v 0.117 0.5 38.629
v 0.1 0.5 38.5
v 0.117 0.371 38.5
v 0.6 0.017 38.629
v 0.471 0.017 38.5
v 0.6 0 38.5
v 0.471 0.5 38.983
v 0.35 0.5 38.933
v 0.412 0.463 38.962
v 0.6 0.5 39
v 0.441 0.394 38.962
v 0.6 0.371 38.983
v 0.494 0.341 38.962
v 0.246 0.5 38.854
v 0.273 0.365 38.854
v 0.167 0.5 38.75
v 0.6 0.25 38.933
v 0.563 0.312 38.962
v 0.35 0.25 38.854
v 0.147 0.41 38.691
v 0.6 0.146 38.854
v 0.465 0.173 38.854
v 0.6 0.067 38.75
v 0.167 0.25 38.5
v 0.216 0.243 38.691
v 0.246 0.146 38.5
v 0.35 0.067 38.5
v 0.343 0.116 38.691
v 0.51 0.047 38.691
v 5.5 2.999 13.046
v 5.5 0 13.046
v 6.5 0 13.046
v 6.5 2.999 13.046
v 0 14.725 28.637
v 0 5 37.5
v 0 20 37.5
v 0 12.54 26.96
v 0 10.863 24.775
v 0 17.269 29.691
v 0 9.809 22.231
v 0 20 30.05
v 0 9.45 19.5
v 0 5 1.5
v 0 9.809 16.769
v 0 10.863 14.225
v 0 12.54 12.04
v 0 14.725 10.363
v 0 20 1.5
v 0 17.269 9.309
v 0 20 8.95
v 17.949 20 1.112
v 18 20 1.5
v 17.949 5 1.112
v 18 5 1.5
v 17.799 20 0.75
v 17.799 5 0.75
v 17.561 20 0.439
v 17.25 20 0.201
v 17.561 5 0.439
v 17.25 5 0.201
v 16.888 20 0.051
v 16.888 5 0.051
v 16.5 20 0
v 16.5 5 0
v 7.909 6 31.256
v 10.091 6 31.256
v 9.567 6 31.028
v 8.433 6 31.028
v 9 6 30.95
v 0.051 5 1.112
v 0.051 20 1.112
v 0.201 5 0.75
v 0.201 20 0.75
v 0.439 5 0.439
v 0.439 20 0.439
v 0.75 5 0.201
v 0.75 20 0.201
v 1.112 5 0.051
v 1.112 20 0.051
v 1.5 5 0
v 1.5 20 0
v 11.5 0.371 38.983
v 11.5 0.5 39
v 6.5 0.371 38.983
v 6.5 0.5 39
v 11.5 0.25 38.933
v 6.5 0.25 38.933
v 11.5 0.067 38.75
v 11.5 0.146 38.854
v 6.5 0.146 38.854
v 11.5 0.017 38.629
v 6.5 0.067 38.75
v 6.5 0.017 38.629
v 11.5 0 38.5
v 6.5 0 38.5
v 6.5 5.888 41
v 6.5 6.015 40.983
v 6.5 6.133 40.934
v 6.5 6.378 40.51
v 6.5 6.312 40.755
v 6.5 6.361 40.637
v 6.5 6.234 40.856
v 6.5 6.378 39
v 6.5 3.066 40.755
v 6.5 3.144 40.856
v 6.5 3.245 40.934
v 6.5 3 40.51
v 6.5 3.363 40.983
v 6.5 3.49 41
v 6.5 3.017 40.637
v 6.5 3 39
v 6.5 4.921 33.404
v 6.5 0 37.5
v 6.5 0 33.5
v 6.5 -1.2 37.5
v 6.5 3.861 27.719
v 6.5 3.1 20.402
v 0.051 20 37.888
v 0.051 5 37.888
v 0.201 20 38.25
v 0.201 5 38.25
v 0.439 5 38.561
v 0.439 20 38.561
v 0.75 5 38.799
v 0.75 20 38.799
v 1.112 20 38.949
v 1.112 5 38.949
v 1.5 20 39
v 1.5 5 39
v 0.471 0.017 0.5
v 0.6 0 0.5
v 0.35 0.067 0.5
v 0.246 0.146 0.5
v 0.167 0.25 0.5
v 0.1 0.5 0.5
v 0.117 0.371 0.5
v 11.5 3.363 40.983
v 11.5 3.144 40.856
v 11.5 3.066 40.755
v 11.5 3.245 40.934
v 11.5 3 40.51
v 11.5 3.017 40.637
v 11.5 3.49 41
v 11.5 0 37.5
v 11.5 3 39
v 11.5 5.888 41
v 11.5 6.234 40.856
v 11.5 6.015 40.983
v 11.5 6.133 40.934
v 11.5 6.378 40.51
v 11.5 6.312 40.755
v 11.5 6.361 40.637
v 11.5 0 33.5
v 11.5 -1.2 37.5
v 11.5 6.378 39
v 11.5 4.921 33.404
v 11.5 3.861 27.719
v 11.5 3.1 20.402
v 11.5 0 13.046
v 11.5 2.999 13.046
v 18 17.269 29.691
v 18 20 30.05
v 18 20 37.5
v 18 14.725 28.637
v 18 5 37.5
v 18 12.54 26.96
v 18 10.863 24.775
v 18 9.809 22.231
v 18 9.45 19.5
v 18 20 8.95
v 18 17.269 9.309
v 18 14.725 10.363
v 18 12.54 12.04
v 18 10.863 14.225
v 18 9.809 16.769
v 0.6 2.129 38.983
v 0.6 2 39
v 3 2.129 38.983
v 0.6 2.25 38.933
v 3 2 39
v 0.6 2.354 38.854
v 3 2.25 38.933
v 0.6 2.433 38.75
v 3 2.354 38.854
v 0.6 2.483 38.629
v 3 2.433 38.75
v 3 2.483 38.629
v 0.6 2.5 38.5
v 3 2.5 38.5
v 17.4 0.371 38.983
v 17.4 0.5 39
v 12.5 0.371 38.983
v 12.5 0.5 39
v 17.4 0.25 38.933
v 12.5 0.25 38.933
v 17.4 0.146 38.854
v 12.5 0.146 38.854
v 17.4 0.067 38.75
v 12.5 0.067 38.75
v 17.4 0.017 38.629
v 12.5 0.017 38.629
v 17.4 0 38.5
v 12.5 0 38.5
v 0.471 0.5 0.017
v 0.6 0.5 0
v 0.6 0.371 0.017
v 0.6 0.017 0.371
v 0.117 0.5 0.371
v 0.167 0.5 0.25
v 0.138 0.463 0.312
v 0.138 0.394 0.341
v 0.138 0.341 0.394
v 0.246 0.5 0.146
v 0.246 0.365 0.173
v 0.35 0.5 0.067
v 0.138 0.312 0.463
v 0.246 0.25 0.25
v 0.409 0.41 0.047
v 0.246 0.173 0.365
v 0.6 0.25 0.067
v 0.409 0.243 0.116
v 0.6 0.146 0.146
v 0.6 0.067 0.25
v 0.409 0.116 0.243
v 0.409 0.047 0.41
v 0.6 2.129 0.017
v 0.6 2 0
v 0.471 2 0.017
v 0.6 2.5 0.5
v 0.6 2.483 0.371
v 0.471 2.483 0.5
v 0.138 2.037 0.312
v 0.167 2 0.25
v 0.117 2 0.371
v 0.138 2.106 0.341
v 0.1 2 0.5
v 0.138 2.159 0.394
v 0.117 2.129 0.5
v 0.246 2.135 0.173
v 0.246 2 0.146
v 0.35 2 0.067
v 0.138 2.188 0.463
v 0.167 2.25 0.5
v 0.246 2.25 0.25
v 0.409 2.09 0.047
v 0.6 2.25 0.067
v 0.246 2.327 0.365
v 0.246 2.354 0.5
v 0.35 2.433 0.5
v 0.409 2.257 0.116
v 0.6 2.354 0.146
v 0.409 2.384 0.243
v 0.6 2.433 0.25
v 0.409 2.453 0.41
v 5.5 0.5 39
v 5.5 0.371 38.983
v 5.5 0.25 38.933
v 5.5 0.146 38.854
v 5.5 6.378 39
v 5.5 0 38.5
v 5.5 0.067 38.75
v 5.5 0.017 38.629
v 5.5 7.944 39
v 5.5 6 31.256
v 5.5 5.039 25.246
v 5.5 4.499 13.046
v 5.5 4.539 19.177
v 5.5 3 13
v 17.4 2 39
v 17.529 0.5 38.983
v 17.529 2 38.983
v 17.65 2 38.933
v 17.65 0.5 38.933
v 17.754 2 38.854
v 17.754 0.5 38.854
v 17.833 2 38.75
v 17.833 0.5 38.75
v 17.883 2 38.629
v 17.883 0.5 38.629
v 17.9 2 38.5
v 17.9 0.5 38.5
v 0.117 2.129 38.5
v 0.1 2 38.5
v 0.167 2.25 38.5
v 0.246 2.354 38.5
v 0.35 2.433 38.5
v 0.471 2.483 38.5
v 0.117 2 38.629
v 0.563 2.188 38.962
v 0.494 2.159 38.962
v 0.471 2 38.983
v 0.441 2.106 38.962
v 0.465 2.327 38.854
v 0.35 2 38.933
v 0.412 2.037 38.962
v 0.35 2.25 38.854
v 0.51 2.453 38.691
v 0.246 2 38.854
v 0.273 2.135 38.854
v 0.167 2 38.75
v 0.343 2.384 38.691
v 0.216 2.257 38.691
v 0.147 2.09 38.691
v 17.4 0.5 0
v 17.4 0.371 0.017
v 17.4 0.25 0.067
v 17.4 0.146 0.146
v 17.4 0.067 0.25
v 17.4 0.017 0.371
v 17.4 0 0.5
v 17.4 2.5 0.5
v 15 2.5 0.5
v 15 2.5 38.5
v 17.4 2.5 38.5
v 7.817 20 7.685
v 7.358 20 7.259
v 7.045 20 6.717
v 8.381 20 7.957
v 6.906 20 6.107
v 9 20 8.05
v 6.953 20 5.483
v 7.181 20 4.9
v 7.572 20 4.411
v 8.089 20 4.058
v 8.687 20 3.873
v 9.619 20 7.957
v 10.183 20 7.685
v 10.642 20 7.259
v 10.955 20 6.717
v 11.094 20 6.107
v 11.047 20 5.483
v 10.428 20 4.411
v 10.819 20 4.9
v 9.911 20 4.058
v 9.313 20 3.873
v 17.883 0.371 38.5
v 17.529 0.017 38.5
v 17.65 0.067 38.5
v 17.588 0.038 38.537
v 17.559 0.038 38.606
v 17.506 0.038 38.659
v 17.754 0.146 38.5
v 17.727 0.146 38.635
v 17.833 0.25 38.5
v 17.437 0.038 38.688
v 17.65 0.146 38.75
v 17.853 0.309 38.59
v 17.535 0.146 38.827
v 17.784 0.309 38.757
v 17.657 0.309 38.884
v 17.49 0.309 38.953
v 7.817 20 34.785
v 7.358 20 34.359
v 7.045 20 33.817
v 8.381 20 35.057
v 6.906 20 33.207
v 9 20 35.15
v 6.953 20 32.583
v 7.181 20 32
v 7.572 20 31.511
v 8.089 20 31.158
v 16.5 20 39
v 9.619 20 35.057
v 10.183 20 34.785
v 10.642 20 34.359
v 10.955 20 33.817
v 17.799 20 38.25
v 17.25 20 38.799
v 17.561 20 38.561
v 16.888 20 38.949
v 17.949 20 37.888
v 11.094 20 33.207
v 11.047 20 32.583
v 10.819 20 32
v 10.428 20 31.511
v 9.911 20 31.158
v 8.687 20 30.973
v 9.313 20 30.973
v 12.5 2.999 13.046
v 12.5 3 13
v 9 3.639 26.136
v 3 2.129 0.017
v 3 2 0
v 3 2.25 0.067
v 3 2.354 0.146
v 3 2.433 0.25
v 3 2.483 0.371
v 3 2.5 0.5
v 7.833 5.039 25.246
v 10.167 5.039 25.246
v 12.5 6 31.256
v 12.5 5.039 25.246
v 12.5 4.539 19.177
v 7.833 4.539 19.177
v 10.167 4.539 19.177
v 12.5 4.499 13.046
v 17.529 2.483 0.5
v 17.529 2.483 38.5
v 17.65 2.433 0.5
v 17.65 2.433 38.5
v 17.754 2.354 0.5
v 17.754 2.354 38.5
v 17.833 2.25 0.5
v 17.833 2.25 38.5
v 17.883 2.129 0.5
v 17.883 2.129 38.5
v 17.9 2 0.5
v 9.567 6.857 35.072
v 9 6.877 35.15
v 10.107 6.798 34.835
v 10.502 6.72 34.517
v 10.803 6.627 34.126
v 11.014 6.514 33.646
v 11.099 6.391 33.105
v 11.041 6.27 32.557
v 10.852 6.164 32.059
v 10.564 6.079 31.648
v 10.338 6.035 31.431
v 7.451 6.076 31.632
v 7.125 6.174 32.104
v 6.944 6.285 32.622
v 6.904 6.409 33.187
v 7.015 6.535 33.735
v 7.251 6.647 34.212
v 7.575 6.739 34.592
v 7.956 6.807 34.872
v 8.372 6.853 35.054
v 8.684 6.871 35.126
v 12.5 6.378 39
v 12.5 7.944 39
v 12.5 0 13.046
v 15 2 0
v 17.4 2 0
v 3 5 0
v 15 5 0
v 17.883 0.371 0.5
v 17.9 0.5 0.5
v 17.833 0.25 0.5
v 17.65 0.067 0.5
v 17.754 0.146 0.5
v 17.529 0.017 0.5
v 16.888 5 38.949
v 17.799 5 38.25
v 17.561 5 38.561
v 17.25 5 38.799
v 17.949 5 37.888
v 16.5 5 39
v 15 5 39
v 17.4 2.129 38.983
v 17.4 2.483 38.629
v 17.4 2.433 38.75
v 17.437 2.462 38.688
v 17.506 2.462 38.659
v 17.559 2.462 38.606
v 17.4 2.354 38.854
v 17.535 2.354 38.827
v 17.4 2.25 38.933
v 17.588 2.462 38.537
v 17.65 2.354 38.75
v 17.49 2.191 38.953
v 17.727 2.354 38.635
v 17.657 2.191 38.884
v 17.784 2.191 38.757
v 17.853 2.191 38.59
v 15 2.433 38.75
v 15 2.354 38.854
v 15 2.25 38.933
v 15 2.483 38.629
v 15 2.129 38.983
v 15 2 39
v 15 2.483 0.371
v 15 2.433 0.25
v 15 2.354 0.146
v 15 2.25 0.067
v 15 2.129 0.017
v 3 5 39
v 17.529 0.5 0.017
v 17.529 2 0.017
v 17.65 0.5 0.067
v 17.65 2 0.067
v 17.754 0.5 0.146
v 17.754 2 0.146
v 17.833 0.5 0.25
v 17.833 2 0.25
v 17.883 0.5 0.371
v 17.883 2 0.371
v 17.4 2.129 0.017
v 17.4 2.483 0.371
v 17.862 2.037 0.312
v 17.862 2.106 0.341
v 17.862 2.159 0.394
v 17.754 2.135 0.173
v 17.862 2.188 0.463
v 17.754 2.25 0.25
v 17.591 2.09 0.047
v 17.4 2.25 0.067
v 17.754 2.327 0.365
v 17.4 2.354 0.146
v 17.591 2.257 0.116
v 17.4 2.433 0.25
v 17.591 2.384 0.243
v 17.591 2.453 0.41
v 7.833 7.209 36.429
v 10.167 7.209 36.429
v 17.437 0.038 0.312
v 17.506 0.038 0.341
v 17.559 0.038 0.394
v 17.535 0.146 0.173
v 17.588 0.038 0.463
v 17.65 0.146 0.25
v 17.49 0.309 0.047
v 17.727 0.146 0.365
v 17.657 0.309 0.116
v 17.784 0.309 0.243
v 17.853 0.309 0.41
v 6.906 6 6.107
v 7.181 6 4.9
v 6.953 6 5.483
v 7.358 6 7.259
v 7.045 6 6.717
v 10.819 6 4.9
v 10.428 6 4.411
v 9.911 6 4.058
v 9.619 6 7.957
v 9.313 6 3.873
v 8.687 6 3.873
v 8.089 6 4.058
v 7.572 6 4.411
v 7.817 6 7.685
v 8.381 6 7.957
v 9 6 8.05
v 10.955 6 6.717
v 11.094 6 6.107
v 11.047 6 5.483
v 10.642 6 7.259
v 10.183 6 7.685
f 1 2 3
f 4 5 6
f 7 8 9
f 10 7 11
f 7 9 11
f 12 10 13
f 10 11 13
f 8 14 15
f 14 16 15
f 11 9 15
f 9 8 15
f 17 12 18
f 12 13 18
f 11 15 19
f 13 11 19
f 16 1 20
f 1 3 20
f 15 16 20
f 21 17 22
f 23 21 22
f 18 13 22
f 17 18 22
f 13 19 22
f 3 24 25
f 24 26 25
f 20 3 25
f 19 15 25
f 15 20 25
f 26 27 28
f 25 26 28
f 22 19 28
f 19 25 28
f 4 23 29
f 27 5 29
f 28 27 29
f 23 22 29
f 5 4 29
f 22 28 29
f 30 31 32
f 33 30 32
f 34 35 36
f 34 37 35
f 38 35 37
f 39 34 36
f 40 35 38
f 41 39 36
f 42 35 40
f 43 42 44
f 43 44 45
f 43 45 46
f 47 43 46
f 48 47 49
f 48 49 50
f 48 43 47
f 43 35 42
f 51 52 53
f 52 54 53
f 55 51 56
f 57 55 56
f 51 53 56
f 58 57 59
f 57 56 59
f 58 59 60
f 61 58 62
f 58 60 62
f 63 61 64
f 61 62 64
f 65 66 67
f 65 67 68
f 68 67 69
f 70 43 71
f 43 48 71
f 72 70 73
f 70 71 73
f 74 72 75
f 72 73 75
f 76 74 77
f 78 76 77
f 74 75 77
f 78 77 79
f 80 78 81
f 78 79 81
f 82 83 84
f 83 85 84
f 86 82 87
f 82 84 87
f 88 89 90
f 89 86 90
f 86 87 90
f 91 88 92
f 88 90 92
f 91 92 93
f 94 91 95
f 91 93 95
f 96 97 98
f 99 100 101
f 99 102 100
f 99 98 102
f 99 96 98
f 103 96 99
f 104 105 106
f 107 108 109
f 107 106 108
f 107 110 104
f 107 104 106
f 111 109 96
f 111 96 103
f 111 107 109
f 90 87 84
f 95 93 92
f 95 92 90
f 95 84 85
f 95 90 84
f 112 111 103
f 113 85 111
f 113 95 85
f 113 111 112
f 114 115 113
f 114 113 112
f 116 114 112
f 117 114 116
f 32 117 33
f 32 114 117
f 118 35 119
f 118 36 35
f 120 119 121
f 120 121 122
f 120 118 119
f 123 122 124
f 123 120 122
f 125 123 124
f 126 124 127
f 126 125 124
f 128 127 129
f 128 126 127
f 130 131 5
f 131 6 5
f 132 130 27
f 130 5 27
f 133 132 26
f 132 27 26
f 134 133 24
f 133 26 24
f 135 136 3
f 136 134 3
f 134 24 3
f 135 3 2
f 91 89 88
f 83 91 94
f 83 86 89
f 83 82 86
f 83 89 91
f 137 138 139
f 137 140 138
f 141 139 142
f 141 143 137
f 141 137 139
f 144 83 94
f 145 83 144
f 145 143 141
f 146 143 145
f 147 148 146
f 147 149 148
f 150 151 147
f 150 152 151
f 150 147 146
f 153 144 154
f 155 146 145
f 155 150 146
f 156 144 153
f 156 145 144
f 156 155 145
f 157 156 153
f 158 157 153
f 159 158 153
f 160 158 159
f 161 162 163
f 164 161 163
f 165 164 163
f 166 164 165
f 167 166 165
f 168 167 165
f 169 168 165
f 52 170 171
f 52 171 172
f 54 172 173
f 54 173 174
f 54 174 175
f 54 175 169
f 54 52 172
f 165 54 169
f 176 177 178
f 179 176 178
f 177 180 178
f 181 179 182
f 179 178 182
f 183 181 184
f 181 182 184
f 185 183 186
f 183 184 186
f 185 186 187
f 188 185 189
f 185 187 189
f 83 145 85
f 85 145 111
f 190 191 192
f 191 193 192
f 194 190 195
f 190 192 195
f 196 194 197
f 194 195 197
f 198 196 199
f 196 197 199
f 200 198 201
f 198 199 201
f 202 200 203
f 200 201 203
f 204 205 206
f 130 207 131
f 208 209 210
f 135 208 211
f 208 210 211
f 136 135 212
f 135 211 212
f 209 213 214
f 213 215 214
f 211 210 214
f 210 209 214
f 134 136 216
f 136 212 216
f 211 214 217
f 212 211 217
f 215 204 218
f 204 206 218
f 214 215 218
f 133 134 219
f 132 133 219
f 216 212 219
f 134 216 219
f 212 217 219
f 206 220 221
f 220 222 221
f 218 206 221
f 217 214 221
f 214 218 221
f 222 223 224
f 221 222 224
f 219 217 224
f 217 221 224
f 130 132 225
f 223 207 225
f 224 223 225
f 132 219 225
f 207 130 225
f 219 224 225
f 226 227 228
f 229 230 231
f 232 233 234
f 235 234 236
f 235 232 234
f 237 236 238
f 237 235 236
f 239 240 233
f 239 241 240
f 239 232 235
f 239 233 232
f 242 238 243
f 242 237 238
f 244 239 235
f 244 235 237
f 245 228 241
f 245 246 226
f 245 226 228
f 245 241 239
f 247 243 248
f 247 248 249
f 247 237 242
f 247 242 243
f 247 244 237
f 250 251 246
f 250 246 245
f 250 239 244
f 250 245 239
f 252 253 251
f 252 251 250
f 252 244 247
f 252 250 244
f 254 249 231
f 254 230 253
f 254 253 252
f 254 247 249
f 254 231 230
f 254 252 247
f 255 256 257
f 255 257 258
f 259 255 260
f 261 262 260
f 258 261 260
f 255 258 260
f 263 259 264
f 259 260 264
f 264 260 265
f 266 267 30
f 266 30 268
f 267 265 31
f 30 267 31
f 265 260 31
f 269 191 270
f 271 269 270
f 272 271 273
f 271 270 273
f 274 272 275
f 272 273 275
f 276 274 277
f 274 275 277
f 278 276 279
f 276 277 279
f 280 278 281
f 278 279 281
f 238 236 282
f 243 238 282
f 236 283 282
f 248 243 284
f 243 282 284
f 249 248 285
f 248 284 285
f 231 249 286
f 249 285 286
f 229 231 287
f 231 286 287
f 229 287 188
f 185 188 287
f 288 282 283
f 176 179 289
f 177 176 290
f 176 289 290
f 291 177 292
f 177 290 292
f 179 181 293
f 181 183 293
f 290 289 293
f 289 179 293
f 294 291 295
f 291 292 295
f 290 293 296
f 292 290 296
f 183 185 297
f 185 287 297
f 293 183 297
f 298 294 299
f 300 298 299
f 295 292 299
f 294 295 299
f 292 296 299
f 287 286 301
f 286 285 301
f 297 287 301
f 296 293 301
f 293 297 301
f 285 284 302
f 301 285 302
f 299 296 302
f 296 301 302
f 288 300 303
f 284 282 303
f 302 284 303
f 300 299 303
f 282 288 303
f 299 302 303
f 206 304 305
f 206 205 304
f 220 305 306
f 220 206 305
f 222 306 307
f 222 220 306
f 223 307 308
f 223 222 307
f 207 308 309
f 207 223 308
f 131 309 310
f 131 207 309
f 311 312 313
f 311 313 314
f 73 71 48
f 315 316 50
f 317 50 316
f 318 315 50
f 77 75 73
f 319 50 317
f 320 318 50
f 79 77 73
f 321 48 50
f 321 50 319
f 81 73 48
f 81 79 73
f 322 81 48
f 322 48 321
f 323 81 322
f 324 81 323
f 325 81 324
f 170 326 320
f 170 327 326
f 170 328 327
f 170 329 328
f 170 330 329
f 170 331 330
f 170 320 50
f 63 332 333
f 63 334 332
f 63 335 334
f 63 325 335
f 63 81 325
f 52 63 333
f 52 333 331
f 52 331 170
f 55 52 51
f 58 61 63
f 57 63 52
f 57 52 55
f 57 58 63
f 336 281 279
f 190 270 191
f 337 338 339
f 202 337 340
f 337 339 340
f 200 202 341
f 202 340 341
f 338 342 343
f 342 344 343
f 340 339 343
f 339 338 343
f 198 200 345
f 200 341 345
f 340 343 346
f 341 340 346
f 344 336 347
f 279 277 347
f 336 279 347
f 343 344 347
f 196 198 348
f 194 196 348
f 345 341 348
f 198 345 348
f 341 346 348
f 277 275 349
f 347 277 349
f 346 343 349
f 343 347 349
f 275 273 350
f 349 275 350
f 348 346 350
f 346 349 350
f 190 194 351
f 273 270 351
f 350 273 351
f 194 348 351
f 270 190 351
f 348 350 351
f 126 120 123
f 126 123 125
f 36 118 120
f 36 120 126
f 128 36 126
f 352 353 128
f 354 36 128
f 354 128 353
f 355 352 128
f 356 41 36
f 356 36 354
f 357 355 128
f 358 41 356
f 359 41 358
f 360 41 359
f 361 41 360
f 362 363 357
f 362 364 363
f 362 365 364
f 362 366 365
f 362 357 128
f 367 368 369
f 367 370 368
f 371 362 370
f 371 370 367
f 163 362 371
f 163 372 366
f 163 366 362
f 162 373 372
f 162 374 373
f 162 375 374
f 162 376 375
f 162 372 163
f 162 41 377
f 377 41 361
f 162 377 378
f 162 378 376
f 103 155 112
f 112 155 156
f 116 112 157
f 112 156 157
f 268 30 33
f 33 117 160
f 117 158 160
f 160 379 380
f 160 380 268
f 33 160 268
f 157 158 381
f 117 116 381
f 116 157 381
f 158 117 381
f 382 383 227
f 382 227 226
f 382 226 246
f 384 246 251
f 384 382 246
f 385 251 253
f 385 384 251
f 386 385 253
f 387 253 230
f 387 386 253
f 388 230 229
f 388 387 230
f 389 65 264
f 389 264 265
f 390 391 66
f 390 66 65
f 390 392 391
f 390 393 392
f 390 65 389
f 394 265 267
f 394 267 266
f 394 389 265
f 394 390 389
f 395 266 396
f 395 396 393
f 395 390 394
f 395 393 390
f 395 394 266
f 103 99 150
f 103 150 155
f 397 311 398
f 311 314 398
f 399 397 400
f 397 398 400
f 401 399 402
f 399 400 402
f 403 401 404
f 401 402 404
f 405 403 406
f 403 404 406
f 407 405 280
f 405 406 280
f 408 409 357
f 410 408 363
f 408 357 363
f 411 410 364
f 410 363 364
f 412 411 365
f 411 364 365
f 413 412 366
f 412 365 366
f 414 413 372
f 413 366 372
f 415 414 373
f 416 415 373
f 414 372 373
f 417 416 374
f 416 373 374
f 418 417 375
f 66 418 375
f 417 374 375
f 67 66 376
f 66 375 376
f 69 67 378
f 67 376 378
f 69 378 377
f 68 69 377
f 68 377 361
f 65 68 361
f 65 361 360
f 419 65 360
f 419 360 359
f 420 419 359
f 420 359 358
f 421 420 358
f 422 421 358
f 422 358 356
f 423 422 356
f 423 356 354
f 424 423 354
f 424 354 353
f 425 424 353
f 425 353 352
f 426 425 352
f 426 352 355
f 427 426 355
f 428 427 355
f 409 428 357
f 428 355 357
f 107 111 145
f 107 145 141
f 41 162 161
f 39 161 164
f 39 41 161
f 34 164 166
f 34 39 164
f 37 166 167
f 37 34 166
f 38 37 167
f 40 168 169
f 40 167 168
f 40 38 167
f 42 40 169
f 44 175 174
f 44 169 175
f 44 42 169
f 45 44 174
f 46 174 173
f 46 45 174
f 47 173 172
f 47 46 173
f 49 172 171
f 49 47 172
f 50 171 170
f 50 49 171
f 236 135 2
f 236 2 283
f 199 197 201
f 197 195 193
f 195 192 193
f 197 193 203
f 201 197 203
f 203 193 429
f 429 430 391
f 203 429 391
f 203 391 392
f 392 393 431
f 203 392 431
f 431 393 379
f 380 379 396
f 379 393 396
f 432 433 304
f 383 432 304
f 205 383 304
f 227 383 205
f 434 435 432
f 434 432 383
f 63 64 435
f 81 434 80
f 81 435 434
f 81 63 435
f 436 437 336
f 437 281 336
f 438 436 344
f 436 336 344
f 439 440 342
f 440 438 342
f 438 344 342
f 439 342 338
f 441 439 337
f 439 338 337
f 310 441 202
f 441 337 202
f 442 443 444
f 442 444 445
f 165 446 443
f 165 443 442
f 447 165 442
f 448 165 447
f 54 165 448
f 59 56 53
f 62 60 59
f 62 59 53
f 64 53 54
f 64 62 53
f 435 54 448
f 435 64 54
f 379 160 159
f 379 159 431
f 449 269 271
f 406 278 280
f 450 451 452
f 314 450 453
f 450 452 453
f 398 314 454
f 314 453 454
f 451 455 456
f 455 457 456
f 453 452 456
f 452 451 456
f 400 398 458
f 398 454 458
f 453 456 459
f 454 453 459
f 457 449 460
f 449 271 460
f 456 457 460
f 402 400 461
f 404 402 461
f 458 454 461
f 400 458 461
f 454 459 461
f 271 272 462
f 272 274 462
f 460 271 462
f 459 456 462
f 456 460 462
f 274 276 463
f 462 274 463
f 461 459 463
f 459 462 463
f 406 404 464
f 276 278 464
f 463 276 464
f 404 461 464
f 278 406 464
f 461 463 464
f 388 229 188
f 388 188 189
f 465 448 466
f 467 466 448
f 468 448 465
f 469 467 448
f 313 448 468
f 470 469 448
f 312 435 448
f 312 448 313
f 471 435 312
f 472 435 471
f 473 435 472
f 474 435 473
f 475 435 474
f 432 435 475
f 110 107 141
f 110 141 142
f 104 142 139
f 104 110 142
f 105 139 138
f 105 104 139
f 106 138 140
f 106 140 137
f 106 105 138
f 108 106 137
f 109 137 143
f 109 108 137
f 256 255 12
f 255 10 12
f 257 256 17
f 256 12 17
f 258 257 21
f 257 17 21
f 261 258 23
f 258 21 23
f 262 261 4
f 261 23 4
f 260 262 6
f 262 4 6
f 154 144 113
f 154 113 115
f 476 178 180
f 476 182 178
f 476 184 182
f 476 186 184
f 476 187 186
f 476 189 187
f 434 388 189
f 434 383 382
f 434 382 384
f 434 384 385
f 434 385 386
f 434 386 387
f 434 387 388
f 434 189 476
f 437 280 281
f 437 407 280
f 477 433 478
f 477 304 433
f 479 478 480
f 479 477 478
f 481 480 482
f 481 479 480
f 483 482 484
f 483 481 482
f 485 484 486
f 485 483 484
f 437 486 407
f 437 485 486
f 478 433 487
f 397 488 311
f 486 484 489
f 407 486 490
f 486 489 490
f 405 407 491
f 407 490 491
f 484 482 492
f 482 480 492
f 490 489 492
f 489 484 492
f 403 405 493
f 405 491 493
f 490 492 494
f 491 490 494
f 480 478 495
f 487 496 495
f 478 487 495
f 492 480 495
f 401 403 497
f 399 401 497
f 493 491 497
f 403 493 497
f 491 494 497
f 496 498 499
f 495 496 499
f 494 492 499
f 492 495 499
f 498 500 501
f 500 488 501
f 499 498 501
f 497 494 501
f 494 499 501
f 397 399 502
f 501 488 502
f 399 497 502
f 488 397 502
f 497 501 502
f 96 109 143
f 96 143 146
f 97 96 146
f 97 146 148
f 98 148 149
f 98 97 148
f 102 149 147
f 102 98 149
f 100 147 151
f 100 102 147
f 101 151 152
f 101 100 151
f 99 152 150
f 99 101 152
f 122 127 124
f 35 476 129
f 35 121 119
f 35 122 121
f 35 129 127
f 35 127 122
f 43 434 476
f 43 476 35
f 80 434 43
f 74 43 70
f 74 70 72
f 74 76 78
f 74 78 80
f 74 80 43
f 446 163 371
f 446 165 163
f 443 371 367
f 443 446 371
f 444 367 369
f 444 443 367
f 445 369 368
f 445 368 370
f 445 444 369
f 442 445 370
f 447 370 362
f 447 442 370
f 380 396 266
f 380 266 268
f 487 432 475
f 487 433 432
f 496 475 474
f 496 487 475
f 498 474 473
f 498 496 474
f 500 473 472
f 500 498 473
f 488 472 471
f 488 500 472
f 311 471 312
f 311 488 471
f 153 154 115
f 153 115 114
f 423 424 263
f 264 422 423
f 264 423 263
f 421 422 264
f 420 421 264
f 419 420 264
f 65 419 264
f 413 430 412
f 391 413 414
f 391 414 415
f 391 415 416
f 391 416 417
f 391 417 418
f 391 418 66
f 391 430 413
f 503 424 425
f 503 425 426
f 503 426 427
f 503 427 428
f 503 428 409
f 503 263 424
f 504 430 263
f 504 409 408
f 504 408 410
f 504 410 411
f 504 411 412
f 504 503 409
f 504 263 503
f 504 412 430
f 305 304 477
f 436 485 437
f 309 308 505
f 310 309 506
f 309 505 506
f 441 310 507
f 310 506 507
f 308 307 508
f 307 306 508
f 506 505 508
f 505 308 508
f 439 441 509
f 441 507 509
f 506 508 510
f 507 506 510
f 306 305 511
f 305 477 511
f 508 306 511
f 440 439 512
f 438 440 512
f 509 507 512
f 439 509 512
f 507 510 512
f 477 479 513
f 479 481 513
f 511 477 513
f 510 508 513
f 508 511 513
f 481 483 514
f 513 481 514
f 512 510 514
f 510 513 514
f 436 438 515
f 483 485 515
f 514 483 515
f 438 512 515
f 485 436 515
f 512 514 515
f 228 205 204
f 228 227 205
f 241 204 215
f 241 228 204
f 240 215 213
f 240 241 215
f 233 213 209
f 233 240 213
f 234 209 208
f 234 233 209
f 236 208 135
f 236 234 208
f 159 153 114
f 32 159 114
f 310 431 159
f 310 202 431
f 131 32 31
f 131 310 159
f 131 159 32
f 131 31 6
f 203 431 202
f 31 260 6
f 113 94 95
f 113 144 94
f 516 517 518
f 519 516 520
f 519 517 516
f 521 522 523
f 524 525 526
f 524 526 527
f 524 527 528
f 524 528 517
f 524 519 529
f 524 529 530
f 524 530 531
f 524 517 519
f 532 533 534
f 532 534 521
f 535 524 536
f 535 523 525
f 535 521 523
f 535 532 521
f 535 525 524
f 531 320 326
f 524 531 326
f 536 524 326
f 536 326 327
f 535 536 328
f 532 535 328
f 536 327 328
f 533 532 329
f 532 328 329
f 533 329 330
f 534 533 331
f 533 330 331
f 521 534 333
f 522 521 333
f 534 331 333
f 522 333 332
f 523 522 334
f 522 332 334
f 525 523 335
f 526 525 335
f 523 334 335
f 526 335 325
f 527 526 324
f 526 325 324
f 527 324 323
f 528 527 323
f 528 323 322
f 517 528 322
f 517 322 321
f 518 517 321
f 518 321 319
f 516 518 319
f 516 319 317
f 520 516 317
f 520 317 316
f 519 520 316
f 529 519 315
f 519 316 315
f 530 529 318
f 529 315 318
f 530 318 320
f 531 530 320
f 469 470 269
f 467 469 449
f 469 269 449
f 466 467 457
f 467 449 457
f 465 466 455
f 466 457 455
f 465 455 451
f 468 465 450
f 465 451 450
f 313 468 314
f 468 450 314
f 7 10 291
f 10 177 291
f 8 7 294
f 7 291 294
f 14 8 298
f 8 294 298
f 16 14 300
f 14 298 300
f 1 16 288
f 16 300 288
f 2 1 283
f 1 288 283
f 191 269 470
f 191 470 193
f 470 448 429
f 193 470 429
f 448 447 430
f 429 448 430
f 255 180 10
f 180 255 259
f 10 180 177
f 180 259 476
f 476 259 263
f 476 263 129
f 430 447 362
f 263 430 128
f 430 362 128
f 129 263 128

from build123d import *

# Parameters (mm, degrees)
BOSS_EXTRUDE1_DEPTH             = 39
HANDLEBARHOLE_R                 = 10.55
CUT_EXTRUDE1_DEPTH              = 48.381430962
SKETCH3_R                       = 2.1
CUT_EXTRUDE2_DEPTH              = 14
BOSS_EXTRUDE2_DEPTH             = 2.5
BOSS_EXTRUDE2_DEPTH_BACK        = 2.5
FILLET1_R                       = 0.5
CUT_EXTRUDE_THIN2_START         = -3.5
CUT_EXTRUDE_THIN2_DEPTH         = 7
CUT_EXTRUDE5_REACH              = 49.381
SKETCH10_W                      = 1
SKETCH10_H                      = 25.953669743
BOSS_EXTRUDE3_REACH             = 46.744
BOSS_EXTRUDE3_DIRECTION_2_REACH = 46.744
FILLET5_R                       = 1.5


# Read off the part's stored shape, not the designer's step: Cut-Extrude-Thin2
with BuildPart() as part:
    # Sketch1 → Boss-Extrude1 (new body)
    with BuildSketch(Plane.XY):
        Polygon((0, 5), (0, 20), (18, 20), (18, 5), (15, 5), (15, 2.5), (17.9, 2.5), (17.9, 0), (0.1, 0), (0.1, 2.5), (3, 2.5), (3, 5), align=None)
    extrude(amount=BOSS_EXTRUDE1_DEPTH)

    # HandlebarHole → Cut-Extrude1 (cut, through all)
    with BuildSketch(Plane(origin=(0, 0, 0), x_dir=(0, 0, -1), z_dir=(1, 0, 0))):
        with Locations((-19.5, 20)):
            Circle(HANDLEBARHOLE_R)
    extrude(amount=CUT_EXTRUDE1_DEPTH, mode=Mode.SUBTRACT)

    # Sketch3 → Cut-Extrude2 (cut)
    with BuildSketch(Plane(origin=(0, 20, 0), x_dir=(1, 0, 0), z_dir=(0, 1, 0))):
        with Locations(Location((9, -5.95, 0), (0, 0, 270))):
            Circle(SKETCH3_R)
        with Locations(Location((9, -33.05, 0), (0, 0, 270))):
            Circle(SKETCH3_R)
    extrude(amount=-CUT_EXTRUDE2_DEPTH, mode=Mode.SUBTRACT)

    # Sketch4 → Boss-Extrude2 (add, two sides: drawn at the far end of the back side and taken through both)
    with BuildSketch(Plane.ZY.offset(-9).offset(-BOSS_EXTRUDE2_DEPTH_BACK)):
        Polygon((33.5, 0), (37.5, 0), (37.5, -1.2), align=None)
    extrude(amount=BOSS_EXTRUDE2_DEPTH + BOSS_EXTRUDE2_DEPTH_BACK)

    # Fillet1
    fillet1_edges = [part.edges().sort_by_distance(p)[0] for p in [
        (17.9, 1.25, 39),
        (1.55, 2.5, 0),
        (16.45, 2.5, 39),
        (16.45, 2.5, 0),
        (17.9, 1.25, 0),
        (9, 0, 0),
        (0.1, 1.25, 0),
        (0.1, 2.5, 19.5),
        (17.9, 2.5, 19.5),
        (17.9, 0, 19.5),
        (0.1, 0, 19.5),
        (1.55, 2.5, 39),
        (0.1, 1.25, 39),
        (9, 0, 39),
    ]]
    fillet(fillet1_edges, radius=FILLET1_R)

    # Cut-Extrude-Thin2 outline → Cut-Extrude-Thin2 (cut)
    with BuildSketch(Plane.ZY.offset(-9).offset(CUT_EXTRUDE_THIN2_START)):
        with BuildLine():
            add(Edge.make_bspline(
                [(39, 6.377827527), (26.271218228, 2.589898365), (13, 3)],
                knots=[0.07295309, 0.07295309, 0.07295309, 1, 1, 1], degree=2))
            Line((39, 6.377827527), (39.000000003, 7.944068421))
            add(Edge.make_bspline(
                [(39.000000003, 7.944068421), (36.434479895, 7.165477311), (33.853278683, 6.517493693), (31.255701113, 6)],
                knots=[0.057086213, 0.057086213, 0.057086213, 0.057086213, 0.342626571, 0.342626571, 0.342626571, 0.342626571], degree=3))
            add(Edge.make_bspline(
                [(31.255701113, 6), (25.275536046, 4.808621641), (19.208573603, 4.308861265), (13.046330257, 4.499284332)],
                knots=[0.342626571, 0.342626571, 0.342626571, 0.342626571, 1, 1, 1, 1], degree=3))
            Line((13.046330257, 4.499284332), (13, 3))
        make_face()
    extrude(amount=CUT_EXTRUDE_THIN2_DEPTH, mode=Mode.SUBTRACT)

    # Sketch10 → Cut-Extrude5 (cut, up to next)
    with BuildSketch(Plane(origin=(0, 0, 0), x_dir=(1, 0, 0), z_dir=(0, 1, 0)), mode=Mode.PRIVATE) as cut_extrude5_sk1:
        with Locations((12, -26.023165129)):
            Rectangle(SKETCH10_W, SKETCH10_H)
    cut_extrude5_tool1 = extrude(cut_extrude5_sk1.sketch, amount=CUT_EXTRUDE5_REACH, mode=Mode.PRIVATE) & part.part
    # Sketch10 → Cut-Extrude5 (cut, up to next)
    with BuildSketch(Plane(origin=(0, 0, 0), x_dir=(1, 0, 0), z_dir=(0, 1, 0)), mode=Mode.PRIVATE) as cut_extrude5_sk2:
        with Locations((6, -26.023165129)):
            Rectangle(SKETCH10_W, SKETCH10_H)
    cut_extrude5_tool2 = extrude(cut_extrude5_sk2.sketch, amount=CUT_EXTRUDE5_REACH, mode=Mode.PRIVATE) & part.part
    add(cut_extrude5_tool1.solids().sort_by_distance((12, 0, 26.023165))[0], mode=Mode.SUBTRACT)
    add(cut_extrude5_tool2.solids().sort_by_distance((6, 0, 26.023165))[0], mode=Mode.SUBTRACT)

    # Boss-Extrude3: up to this face of the body (flat: up to its plane)
    boss_extrude3_end = Plane(part.part.faces().sort_by_distance((6.5, 2.064317156, 28.033592375))[0])
    # Sketch11 → Boss-Extrude3 (add, up to the picked face)
    with BuildSketch(Plane.ZY.offset(-9), mode=Mode.PRIVATE) as boss_extrude3_sk1:
        with BuildLine():
            Line((39, 3), (40.51, 3))
            ThreePointArc((40.51, 3), (40.856482323, 3.143517677), (41, 3.49))
            Line((41, 3.49), (41, 5.887827527))
            ThreePointArc((41, 5.887827527), (40.856482323, 6.23430985), (40.51, 6.377827527))
            Line((40.51, 6.377827527), (39, 6.377827527))
            Line((39, 6.377827527), (39, 3))
        make_face()
    boss_extrude3_tool1 = split(extrude(boss_extrude3_sk1.sketch, amount=BOSS_EXTRUDE3_REACH, mode=Mode.PRIVATE), bisect_by=boss_extrude3_end, keep=Keep.BOTH, mode=Mode.PRIVATE)
    add(boss_extrude3_tool1.solids().sort_by(Axis((9, 4.688914, 39.986205), (-1, 0, 0)))[0])

    # Boss-Extrude3 direction 2: up to this face of the body (flat: up to its plane)
    boss_extrude3_direction_2_end = Plane(part.part.faces().sort_by_distance((11.5, 2.064317156, 28.033592375))[0])
    # Sketch11 → Boss-Extrude3 direction 2 (add, up to the picked face)
    with BuildSketch(Plane.ZY.offset(-9), mode=Mode.PRIVATE) as boss_extrude3_direction_2_sk1:
        with BuildLine():
            Line((39, 3), (40.51, 3))
            ThreePointArc((40.51, 3), (40.856482323, 3.143517677), (41, 3.49))
            Line((41, 3.49), (41, 5.887827527))
            ThreePointArc((41, 5.887827527), (40.856482323, 6.23430985), (40.51, 6.377827527))
            Line((40.51, 6.377827527), (39, 6.377827527))
            Line((39, 6.377827527), (39, 3))
        make_face()
    boss_extrude3_direction_2_tool1 = split(extrude(boss_extrude3_direction_2_sk1.sketch, amount=-BOSS_EXTRUDE3_DIRECTION_2_REACH, mode=Mode.PRIVATE), bisect_by=boss_extrude3_direction_2_end, keep=Keep.BOTH, mode=Mode.PRIVATE)
    add(boss_extrude3_direction_2_tool1.solids().sort_by(Axis((9, 4.688914, 39.986205), (1, 0, 0)))[0])

    # Fillet5
    fillet5_edges = [part.edges().sort_by_distance(p)[0] for p in [
        (0, 12.5, 0),
        (18, 12.5, 0),
        (18, 12.5, 39),
        (0, 12.5, 39),
    ]]
    fillet(fillet5_edges, radius=FILLET5_R)


solid = part.part
